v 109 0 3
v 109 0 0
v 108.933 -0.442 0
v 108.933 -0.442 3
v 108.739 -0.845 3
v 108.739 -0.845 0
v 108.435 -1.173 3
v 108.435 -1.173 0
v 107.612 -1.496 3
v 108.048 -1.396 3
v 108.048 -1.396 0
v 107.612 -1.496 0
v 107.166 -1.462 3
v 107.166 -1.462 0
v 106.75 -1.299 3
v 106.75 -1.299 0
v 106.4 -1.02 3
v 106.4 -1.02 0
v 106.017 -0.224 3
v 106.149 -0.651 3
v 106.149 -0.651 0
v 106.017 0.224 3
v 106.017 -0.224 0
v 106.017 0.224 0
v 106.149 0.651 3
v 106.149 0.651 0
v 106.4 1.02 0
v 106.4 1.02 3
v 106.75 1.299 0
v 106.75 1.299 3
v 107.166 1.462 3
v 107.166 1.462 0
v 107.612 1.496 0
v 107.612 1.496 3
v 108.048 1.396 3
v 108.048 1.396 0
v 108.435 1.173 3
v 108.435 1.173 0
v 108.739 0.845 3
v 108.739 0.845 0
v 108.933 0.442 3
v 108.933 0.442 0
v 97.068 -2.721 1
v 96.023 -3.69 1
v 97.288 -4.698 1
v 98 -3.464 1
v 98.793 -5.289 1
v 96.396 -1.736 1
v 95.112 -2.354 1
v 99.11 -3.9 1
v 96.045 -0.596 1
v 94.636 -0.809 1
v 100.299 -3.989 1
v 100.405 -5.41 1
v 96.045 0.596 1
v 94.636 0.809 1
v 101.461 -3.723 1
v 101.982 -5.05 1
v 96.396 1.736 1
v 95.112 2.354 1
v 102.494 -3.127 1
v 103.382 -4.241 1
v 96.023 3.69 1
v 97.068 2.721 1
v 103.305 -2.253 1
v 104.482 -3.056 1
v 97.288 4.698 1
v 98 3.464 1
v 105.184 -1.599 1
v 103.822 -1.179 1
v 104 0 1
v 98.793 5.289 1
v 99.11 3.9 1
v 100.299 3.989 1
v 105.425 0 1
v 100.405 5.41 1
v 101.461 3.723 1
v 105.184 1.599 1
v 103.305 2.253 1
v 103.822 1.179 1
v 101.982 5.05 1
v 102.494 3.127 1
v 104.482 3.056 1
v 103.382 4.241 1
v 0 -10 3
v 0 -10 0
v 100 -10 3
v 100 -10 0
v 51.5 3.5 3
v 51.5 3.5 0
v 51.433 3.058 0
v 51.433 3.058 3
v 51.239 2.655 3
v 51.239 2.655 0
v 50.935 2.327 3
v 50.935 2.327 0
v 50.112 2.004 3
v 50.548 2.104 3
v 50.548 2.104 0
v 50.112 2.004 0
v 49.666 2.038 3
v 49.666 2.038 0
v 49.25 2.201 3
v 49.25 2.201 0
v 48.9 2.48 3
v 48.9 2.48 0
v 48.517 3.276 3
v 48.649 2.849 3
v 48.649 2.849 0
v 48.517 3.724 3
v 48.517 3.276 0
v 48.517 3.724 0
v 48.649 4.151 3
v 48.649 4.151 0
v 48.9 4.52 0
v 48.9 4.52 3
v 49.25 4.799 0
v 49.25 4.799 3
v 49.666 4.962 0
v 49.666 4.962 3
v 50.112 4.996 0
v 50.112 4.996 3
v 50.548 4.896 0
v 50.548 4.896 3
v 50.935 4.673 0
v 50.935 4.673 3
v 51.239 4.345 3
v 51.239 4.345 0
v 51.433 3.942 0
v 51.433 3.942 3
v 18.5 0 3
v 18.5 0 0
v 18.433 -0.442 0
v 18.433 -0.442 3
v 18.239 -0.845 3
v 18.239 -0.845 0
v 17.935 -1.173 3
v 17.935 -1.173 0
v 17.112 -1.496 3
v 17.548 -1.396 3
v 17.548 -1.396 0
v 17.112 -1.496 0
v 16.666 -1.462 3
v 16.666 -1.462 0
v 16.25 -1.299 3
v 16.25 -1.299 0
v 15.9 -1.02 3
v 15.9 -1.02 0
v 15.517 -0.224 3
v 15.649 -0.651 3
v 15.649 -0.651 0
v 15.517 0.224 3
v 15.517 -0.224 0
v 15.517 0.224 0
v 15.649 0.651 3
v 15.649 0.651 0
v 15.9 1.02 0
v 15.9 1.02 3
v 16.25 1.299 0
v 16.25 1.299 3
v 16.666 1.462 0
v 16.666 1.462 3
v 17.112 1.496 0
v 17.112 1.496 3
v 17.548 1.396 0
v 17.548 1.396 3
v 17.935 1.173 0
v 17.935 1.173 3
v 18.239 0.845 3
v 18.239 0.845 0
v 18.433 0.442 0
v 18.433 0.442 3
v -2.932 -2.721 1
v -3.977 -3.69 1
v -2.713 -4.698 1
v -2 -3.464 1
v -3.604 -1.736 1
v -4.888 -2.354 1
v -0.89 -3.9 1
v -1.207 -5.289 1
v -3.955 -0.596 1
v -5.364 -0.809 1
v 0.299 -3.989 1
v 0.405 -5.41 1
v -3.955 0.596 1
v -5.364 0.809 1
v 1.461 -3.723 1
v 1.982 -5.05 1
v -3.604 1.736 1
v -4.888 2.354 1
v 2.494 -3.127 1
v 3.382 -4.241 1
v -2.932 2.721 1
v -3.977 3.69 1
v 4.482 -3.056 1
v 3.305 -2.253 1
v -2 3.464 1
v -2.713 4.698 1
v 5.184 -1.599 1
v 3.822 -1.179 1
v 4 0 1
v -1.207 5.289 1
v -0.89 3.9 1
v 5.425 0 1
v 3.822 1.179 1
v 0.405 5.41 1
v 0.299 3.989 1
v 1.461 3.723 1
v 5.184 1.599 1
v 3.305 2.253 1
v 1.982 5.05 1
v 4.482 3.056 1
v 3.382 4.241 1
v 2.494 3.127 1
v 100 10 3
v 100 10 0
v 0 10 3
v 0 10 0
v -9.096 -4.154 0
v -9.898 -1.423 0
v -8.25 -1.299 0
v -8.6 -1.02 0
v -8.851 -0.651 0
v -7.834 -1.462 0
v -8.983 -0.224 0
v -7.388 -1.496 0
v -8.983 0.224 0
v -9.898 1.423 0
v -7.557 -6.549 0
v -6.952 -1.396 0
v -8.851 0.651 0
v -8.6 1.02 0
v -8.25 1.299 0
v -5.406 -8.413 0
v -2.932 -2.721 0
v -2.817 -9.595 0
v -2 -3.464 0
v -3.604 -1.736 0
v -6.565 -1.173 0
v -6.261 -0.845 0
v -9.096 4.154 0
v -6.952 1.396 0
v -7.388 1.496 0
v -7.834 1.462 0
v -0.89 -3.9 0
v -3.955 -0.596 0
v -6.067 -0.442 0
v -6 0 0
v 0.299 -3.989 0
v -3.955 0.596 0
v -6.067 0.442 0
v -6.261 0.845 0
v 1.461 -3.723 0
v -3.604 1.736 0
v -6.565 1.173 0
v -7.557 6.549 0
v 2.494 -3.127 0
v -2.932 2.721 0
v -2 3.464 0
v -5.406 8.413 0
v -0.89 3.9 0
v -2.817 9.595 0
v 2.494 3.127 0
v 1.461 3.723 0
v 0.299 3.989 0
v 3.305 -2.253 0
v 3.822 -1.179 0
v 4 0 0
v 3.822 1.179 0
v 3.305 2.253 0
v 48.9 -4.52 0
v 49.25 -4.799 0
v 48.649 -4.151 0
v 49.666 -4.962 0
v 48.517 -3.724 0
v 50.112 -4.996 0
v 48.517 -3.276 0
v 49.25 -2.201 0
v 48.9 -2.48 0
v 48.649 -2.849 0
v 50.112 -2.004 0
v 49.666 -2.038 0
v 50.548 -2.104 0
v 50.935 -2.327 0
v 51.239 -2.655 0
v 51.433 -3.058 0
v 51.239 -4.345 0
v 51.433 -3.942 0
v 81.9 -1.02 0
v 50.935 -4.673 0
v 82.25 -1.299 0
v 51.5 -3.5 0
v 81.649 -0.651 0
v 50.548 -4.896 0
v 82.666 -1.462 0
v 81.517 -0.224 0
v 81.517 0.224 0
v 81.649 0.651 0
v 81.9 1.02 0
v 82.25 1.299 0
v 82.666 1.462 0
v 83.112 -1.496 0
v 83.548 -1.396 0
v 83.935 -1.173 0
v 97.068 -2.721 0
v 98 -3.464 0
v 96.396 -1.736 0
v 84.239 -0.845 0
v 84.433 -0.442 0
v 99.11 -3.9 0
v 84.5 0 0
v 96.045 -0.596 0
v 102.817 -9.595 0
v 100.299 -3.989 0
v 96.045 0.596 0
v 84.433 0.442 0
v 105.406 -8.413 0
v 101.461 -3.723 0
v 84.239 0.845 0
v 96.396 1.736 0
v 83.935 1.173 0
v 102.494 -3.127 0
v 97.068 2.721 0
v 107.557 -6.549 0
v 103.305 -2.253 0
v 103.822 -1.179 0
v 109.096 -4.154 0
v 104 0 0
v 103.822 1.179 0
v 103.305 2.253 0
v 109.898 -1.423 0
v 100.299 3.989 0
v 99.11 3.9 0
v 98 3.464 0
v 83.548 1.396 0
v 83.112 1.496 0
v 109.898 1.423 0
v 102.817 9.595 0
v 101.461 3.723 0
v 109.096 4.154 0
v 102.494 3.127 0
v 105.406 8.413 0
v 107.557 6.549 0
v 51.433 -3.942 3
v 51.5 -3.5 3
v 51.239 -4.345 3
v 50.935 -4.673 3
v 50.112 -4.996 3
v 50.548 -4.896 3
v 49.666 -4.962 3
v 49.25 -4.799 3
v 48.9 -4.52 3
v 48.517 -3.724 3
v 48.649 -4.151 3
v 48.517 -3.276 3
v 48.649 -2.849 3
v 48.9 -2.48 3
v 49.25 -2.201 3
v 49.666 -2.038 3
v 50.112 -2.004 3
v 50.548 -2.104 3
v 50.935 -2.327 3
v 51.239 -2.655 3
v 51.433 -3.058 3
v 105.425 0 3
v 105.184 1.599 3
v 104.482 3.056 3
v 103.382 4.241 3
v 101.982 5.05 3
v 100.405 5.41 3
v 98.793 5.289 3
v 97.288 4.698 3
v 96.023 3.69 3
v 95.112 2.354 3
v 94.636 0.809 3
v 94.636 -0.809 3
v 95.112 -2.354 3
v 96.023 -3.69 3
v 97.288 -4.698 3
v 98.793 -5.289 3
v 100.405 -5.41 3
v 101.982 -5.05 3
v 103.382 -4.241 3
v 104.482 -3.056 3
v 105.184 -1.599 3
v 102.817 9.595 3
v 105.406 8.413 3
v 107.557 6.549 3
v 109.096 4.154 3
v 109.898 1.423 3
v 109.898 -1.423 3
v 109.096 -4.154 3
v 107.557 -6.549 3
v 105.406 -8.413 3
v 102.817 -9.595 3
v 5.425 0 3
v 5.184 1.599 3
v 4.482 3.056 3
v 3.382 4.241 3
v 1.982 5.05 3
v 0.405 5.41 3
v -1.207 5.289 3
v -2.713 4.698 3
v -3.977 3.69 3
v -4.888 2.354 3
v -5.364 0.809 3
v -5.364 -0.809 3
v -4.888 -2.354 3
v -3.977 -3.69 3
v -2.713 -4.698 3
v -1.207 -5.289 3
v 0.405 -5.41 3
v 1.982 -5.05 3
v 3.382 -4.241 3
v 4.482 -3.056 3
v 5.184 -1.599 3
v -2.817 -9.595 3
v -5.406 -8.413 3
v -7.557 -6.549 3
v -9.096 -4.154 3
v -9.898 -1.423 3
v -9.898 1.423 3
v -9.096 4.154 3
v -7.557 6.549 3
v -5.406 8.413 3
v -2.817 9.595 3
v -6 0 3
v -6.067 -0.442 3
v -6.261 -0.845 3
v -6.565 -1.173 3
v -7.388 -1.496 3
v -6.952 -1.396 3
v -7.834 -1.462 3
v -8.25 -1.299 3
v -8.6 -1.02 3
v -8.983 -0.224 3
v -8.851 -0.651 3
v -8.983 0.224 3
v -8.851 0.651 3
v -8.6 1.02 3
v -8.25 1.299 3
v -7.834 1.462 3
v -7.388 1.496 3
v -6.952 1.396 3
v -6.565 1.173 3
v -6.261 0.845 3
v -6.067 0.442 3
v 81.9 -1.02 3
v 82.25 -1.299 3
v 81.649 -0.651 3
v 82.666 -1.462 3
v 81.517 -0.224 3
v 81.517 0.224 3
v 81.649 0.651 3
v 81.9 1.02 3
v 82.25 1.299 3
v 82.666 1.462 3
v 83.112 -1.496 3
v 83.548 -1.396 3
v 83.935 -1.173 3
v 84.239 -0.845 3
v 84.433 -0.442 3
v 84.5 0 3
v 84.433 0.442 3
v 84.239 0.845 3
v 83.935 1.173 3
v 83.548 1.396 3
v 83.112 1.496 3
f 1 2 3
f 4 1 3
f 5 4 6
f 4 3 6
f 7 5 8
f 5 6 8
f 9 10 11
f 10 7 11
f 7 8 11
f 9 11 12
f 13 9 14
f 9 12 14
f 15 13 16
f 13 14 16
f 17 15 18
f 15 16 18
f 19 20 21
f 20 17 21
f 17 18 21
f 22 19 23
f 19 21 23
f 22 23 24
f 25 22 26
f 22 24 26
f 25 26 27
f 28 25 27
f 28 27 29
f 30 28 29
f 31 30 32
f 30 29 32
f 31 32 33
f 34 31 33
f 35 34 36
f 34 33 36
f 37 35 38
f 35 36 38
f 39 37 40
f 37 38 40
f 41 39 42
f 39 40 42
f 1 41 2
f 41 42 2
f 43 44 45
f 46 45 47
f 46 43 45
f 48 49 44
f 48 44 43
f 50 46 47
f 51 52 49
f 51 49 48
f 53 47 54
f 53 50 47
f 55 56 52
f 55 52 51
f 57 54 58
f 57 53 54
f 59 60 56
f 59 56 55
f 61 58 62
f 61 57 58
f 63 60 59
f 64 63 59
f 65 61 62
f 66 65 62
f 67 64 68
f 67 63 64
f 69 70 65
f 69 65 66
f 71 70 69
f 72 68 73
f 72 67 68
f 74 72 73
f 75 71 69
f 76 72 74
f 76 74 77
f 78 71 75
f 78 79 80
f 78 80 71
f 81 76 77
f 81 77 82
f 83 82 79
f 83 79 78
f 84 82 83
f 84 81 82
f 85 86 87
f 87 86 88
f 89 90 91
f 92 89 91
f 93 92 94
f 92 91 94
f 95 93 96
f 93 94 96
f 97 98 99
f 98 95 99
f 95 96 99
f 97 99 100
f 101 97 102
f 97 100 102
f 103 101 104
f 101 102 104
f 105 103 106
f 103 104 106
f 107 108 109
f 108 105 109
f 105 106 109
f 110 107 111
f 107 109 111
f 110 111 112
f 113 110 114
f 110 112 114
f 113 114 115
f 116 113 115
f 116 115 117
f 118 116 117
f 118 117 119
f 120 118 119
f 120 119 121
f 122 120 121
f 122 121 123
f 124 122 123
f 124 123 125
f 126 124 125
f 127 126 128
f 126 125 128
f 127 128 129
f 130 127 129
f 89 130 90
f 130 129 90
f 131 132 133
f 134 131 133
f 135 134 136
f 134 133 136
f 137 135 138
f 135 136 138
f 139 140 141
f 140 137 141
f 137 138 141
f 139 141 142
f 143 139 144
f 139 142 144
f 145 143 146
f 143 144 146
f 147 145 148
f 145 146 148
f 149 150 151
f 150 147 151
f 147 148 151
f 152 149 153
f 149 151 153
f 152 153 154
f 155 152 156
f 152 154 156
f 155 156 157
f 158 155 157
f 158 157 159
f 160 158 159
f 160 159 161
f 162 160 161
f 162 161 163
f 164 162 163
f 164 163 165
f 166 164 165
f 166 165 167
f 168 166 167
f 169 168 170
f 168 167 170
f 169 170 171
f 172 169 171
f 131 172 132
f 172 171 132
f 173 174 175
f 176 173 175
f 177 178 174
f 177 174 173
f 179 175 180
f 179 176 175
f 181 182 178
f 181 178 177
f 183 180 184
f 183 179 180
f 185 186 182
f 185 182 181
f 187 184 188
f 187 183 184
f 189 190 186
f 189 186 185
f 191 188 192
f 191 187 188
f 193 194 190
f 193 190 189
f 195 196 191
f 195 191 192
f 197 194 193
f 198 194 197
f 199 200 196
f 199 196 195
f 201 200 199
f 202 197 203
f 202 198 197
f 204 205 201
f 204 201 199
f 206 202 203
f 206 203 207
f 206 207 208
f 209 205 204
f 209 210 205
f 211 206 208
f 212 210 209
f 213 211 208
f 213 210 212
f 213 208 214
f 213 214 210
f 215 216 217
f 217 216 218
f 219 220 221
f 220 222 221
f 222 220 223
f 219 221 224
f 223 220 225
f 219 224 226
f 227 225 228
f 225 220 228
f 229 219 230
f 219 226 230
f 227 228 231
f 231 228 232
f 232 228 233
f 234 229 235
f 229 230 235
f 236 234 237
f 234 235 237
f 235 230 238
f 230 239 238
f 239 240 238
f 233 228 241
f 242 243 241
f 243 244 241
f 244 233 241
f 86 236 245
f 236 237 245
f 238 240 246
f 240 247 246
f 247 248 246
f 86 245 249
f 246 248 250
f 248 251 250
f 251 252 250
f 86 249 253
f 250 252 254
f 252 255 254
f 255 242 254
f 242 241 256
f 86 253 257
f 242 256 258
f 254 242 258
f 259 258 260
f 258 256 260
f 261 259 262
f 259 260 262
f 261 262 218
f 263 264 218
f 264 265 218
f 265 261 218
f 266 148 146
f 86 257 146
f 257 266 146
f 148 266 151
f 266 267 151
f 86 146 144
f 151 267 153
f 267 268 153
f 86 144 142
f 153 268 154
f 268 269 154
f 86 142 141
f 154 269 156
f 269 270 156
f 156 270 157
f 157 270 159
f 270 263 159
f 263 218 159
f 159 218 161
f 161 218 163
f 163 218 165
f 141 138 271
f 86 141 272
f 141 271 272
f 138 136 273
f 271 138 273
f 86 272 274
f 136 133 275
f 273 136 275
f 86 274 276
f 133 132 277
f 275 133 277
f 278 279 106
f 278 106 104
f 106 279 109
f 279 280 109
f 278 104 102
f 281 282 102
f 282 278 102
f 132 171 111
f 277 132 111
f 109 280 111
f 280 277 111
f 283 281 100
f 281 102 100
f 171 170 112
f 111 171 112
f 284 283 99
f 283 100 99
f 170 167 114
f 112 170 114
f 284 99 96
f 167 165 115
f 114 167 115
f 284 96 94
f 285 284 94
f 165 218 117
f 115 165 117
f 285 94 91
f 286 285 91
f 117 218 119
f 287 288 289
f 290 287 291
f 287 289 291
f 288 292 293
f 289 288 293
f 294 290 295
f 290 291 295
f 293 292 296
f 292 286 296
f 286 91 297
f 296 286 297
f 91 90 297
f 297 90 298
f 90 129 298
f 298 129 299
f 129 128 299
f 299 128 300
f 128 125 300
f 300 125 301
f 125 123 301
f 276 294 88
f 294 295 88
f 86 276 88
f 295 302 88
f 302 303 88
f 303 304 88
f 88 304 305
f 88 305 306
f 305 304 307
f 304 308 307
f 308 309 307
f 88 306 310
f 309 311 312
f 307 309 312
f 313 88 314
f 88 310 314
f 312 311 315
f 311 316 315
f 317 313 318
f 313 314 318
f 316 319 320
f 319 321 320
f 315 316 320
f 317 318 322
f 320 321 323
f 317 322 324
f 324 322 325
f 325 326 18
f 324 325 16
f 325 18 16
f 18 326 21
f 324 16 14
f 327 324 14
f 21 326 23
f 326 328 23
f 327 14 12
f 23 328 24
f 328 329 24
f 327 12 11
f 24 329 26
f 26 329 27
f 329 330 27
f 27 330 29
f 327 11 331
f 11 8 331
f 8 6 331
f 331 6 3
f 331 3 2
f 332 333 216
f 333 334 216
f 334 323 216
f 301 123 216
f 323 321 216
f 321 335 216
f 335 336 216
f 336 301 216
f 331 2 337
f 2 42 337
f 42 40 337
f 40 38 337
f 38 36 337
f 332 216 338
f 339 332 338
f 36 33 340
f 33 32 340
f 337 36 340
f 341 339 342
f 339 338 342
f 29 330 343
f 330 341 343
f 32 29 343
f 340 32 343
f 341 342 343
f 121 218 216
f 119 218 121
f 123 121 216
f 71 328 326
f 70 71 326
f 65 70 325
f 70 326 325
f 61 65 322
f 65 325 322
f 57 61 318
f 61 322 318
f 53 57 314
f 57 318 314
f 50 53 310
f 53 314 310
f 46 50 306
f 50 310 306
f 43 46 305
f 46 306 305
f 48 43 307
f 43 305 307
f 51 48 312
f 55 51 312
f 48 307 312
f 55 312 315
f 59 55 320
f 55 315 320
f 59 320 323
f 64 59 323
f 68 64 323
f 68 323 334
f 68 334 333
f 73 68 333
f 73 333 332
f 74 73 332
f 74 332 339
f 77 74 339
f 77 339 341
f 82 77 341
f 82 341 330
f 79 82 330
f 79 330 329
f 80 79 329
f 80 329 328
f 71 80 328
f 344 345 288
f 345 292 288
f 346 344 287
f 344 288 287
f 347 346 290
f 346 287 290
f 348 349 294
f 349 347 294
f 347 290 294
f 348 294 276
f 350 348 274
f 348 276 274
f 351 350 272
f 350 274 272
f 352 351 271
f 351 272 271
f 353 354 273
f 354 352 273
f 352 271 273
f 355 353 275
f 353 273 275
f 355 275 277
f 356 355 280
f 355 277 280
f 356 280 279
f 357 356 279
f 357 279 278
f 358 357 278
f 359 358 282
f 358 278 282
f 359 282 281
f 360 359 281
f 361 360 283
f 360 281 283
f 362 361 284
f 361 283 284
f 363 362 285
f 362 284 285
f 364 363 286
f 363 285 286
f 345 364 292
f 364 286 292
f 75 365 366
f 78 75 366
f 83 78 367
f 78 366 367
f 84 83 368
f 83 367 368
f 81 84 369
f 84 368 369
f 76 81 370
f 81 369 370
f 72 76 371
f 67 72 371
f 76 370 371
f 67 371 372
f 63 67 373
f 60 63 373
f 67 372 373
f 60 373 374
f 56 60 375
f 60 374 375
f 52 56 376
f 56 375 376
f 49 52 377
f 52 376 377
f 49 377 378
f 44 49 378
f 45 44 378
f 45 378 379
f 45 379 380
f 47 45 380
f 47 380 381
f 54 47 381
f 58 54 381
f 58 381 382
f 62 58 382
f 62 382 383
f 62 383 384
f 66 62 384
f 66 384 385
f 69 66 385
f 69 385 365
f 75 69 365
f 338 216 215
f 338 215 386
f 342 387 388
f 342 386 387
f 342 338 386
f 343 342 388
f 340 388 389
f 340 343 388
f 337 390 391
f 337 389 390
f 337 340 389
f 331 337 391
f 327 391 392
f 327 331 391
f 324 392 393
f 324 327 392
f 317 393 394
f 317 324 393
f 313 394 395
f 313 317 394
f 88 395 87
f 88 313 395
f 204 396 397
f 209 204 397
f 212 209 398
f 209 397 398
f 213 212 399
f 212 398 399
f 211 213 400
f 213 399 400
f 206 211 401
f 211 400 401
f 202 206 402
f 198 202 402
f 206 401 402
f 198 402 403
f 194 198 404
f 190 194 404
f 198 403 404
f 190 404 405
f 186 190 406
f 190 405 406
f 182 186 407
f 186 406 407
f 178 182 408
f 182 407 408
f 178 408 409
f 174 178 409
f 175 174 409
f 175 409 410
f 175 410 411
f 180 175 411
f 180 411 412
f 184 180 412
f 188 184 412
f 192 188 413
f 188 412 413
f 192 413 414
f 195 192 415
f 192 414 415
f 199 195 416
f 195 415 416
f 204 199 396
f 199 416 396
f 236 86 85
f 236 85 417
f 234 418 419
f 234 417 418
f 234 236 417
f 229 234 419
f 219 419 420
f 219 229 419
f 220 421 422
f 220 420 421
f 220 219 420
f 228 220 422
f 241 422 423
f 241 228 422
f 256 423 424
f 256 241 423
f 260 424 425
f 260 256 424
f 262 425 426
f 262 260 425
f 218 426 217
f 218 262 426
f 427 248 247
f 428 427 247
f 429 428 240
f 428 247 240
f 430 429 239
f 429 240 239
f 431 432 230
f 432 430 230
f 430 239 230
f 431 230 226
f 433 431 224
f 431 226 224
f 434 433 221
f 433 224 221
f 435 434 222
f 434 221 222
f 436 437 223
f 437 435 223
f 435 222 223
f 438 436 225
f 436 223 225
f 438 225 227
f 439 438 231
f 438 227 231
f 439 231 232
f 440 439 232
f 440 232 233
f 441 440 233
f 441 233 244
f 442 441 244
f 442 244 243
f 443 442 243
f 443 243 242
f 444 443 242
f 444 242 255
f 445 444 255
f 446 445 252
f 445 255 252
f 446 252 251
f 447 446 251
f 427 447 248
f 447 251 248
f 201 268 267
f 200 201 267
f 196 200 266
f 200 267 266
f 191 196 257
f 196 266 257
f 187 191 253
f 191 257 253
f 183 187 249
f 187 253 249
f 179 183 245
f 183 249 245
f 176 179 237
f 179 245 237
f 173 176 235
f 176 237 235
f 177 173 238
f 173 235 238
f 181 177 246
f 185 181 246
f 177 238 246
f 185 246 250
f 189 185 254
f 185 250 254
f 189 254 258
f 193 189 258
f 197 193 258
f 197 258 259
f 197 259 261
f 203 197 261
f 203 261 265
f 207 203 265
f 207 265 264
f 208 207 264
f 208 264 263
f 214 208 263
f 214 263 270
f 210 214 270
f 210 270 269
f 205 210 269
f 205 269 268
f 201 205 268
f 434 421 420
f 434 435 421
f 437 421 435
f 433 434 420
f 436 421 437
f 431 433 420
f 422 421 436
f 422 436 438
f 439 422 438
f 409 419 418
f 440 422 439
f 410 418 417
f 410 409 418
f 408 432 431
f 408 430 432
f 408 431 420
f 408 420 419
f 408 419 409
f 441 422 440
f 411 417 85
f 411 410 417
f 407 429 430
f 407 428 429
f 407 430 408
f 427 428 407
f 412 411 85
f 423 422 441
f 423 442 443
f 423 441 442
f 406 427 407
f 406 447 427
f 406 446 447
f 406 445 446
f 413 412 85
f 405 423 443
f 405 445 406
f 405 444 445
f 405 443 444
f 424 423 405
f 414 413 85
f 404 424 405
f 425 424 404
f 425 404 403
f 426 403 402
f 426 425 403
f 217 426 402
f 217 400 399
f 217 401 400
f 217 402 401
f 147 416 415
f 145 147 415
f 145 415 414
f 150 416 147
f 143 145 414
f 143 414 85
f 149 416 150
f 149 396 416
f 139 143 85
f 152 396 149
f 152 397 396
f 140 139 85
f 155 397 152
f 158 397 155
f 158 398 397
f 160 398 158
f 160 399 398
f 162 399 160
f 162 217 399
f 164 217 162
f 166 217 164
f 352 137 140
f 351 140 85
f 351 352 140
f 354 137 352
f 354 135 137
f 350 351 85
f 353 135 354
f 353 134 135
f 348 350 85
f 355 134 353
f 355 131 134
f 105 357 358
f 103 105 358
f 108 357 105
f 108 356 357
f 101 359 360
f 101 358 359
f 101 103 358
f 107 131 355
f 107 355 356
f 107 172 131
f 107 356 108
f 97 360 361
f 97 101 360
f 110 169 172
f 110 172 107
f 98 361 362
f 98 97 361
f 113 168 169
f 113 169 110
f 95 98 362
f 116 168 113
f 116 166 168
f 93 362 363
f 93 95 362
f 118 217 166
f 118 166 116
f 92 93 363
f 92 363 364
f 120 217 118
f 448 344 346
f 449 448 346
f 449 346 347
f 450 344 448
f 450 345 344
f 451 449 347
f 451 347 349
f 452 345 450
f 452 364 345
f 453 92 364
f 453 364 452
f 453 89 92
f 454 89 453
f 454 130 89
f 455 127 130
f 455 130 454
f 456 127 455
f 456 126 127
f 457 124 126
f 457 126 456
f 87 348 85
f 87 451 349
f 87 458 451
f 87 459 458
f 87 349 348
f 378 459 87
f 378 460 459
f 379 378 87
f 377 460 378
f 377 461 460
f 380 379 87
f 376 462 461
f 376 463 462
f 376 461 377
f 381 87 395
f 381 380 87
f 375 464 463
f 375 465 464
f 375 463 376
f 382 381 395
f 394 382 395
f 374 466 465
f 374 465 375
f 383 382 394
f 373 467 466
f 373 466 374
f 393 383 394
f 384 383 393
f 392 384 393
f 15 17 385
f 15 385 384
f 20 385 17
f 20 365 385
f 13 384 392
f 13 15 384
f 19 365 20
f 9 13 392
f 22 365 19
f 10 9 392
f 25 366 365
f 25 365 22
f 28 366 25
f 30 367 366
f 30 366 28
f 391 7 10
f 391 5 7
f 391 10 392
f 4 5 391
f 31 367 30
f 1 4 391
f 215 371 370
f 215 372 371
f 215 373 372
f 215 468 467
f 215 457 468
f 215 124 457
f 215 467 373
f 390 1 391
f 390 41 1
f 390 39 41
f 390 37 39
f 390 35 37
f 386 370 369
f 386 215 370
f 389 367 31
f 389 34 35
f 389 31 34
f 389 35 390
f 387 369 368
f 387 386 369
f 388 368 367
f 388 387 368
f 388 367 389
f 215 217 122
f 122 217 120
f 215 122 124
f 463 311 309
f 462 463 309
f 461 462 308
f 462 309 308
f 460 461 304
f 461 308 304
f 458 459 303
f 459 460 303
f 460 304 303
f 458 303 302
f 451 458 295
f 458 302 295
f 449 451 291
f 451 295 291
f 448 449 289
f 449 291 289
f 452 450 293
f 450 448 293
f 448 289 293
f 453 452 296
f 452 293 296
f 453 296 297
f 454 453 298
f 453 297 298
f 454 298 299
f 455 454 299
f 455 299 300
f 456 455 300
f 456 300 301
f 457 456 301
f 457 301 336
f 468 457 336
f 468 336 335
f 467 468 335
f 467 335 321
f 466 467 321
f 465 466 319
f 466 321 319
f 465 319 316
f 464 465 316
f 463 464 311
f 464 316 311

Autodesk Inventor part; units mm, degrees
ref_plane "YZ Plane" through (0, 0, 0) normal (1, 0, 0) x (0, 1, 0)
ref_plane "XZ Plane" through (0, 0, 0) normal (0, 1, 0) x (-1, 0, 0)
ref_plane "XY Plane" through (0, 0, 0) normal (0, 0, 1) x (1, 0, 0)
sketch "Sketch1" plane through (0, 0, 0) normal (0, 0, 1) x (1, 0, 0)
  line L0 (0, 0) -> (100, 0) construction
  line L1 (0, -10) -> (100, -10)
  line L2 (100, 10) -> (0, 10)
  arc A0 (0, 10) -> (0, -10) centre (0, 0) ccw
  arc A1 (100, -10) -> (100, 10) centre (100, 0) ccw
  line L3 (0, 0) -> (100, 0) construction
  circle A2 centre (0, 0) radius 4
  circle A3 centre (100, 0) radius 4
  circle A4 centre (50, 3.5) radius 1.5
  circle A5 centre (50, -3.5) radius 1.5
  circle A6 centre (107.5, 0) radius 1.5
  circle A7 centre (-7.5, 0) radius 1.5
  circle A8 centre (17, 0) radius 1.5
  circle A9 centre (83, 0) radius 1.5
  point P0 (50, 0)
  point P1 (50, 0)
  dimension "d0" = 100
  dimension "d1" = 0
  dimension "d2" = 20
  dimension "d3" = 8
  dimension "d4" = 8
  dimension "d5" = 3
  dimension "d6" = 3
  dimension "d7" = 3
  dimension "d8" = 3
  dimension "d9" = 0
  dimension "d10" = 7.5
  dimension "d11" = 0
  dimension "d12" = 7.5
  dimension "d13" = 3
  dimension "d14" = 3
  dimension "d15" = 3.5
  dimension "d16" = 3.5
  dimension "d17" = 17
  dimension "d18" = 17
  dimension "d19" = 0
  dimension "d20" = 0
extrude "Extrusion1" add sketch "Sketch1" along normal blind 3
sketch "Sketch2" plane through (0, 0, 3) normal (0, 0, 1) x (1, 0, 0)
  circle A0 centre (0, 0) radius 4 projected
  circle A1 centre (100, 0) radius 4 projected
  circle A2 centre (0, 0) radius 5.425
  circle A3 centre (100, 0) radius 5.425
  dimension "d23" = 10.85
  dimension "d24" = 10.85
extrude "Extrusion2" cut sketch "Sketch2" against normal blind 2 contours A0 | A1 | A2 | A3
sketch "Sketch3" plane through (0, 0, 3) normal (0, 0, 1) x (1, 0, 0)
  circle A0 centre (0, 0) radius 5.425 projected
  circle A1 centre (100, 0) radius 5.425 projected
  arc A2 (100, -10) -> (100, 10) centre (100, 0) ccw projected
  line L0 (100, 10) -> (0, 10) projected
  arc A3 (0, 10) -> (0, -10) centre (0, 0) ccw projected
  line L1 (0, -10) -> (100, -10) projected
  circle A4 centre (50, 3.5) radius 1.5 projected
  circle A5 centre (50, -3.5) radius 1.5 projected
  circle A6 centre (17, 0) radius 1.5 projected
  circle A7 centre (83, 0) radius 1.5 projected
  circle A8 centre (-7.5, 0) radius 1.5 projected
  circle A9 centre (107.5, 0) radius 1.5 projected
properties part number "Arm4_3D" material "Aluminum 6061, Welded"
